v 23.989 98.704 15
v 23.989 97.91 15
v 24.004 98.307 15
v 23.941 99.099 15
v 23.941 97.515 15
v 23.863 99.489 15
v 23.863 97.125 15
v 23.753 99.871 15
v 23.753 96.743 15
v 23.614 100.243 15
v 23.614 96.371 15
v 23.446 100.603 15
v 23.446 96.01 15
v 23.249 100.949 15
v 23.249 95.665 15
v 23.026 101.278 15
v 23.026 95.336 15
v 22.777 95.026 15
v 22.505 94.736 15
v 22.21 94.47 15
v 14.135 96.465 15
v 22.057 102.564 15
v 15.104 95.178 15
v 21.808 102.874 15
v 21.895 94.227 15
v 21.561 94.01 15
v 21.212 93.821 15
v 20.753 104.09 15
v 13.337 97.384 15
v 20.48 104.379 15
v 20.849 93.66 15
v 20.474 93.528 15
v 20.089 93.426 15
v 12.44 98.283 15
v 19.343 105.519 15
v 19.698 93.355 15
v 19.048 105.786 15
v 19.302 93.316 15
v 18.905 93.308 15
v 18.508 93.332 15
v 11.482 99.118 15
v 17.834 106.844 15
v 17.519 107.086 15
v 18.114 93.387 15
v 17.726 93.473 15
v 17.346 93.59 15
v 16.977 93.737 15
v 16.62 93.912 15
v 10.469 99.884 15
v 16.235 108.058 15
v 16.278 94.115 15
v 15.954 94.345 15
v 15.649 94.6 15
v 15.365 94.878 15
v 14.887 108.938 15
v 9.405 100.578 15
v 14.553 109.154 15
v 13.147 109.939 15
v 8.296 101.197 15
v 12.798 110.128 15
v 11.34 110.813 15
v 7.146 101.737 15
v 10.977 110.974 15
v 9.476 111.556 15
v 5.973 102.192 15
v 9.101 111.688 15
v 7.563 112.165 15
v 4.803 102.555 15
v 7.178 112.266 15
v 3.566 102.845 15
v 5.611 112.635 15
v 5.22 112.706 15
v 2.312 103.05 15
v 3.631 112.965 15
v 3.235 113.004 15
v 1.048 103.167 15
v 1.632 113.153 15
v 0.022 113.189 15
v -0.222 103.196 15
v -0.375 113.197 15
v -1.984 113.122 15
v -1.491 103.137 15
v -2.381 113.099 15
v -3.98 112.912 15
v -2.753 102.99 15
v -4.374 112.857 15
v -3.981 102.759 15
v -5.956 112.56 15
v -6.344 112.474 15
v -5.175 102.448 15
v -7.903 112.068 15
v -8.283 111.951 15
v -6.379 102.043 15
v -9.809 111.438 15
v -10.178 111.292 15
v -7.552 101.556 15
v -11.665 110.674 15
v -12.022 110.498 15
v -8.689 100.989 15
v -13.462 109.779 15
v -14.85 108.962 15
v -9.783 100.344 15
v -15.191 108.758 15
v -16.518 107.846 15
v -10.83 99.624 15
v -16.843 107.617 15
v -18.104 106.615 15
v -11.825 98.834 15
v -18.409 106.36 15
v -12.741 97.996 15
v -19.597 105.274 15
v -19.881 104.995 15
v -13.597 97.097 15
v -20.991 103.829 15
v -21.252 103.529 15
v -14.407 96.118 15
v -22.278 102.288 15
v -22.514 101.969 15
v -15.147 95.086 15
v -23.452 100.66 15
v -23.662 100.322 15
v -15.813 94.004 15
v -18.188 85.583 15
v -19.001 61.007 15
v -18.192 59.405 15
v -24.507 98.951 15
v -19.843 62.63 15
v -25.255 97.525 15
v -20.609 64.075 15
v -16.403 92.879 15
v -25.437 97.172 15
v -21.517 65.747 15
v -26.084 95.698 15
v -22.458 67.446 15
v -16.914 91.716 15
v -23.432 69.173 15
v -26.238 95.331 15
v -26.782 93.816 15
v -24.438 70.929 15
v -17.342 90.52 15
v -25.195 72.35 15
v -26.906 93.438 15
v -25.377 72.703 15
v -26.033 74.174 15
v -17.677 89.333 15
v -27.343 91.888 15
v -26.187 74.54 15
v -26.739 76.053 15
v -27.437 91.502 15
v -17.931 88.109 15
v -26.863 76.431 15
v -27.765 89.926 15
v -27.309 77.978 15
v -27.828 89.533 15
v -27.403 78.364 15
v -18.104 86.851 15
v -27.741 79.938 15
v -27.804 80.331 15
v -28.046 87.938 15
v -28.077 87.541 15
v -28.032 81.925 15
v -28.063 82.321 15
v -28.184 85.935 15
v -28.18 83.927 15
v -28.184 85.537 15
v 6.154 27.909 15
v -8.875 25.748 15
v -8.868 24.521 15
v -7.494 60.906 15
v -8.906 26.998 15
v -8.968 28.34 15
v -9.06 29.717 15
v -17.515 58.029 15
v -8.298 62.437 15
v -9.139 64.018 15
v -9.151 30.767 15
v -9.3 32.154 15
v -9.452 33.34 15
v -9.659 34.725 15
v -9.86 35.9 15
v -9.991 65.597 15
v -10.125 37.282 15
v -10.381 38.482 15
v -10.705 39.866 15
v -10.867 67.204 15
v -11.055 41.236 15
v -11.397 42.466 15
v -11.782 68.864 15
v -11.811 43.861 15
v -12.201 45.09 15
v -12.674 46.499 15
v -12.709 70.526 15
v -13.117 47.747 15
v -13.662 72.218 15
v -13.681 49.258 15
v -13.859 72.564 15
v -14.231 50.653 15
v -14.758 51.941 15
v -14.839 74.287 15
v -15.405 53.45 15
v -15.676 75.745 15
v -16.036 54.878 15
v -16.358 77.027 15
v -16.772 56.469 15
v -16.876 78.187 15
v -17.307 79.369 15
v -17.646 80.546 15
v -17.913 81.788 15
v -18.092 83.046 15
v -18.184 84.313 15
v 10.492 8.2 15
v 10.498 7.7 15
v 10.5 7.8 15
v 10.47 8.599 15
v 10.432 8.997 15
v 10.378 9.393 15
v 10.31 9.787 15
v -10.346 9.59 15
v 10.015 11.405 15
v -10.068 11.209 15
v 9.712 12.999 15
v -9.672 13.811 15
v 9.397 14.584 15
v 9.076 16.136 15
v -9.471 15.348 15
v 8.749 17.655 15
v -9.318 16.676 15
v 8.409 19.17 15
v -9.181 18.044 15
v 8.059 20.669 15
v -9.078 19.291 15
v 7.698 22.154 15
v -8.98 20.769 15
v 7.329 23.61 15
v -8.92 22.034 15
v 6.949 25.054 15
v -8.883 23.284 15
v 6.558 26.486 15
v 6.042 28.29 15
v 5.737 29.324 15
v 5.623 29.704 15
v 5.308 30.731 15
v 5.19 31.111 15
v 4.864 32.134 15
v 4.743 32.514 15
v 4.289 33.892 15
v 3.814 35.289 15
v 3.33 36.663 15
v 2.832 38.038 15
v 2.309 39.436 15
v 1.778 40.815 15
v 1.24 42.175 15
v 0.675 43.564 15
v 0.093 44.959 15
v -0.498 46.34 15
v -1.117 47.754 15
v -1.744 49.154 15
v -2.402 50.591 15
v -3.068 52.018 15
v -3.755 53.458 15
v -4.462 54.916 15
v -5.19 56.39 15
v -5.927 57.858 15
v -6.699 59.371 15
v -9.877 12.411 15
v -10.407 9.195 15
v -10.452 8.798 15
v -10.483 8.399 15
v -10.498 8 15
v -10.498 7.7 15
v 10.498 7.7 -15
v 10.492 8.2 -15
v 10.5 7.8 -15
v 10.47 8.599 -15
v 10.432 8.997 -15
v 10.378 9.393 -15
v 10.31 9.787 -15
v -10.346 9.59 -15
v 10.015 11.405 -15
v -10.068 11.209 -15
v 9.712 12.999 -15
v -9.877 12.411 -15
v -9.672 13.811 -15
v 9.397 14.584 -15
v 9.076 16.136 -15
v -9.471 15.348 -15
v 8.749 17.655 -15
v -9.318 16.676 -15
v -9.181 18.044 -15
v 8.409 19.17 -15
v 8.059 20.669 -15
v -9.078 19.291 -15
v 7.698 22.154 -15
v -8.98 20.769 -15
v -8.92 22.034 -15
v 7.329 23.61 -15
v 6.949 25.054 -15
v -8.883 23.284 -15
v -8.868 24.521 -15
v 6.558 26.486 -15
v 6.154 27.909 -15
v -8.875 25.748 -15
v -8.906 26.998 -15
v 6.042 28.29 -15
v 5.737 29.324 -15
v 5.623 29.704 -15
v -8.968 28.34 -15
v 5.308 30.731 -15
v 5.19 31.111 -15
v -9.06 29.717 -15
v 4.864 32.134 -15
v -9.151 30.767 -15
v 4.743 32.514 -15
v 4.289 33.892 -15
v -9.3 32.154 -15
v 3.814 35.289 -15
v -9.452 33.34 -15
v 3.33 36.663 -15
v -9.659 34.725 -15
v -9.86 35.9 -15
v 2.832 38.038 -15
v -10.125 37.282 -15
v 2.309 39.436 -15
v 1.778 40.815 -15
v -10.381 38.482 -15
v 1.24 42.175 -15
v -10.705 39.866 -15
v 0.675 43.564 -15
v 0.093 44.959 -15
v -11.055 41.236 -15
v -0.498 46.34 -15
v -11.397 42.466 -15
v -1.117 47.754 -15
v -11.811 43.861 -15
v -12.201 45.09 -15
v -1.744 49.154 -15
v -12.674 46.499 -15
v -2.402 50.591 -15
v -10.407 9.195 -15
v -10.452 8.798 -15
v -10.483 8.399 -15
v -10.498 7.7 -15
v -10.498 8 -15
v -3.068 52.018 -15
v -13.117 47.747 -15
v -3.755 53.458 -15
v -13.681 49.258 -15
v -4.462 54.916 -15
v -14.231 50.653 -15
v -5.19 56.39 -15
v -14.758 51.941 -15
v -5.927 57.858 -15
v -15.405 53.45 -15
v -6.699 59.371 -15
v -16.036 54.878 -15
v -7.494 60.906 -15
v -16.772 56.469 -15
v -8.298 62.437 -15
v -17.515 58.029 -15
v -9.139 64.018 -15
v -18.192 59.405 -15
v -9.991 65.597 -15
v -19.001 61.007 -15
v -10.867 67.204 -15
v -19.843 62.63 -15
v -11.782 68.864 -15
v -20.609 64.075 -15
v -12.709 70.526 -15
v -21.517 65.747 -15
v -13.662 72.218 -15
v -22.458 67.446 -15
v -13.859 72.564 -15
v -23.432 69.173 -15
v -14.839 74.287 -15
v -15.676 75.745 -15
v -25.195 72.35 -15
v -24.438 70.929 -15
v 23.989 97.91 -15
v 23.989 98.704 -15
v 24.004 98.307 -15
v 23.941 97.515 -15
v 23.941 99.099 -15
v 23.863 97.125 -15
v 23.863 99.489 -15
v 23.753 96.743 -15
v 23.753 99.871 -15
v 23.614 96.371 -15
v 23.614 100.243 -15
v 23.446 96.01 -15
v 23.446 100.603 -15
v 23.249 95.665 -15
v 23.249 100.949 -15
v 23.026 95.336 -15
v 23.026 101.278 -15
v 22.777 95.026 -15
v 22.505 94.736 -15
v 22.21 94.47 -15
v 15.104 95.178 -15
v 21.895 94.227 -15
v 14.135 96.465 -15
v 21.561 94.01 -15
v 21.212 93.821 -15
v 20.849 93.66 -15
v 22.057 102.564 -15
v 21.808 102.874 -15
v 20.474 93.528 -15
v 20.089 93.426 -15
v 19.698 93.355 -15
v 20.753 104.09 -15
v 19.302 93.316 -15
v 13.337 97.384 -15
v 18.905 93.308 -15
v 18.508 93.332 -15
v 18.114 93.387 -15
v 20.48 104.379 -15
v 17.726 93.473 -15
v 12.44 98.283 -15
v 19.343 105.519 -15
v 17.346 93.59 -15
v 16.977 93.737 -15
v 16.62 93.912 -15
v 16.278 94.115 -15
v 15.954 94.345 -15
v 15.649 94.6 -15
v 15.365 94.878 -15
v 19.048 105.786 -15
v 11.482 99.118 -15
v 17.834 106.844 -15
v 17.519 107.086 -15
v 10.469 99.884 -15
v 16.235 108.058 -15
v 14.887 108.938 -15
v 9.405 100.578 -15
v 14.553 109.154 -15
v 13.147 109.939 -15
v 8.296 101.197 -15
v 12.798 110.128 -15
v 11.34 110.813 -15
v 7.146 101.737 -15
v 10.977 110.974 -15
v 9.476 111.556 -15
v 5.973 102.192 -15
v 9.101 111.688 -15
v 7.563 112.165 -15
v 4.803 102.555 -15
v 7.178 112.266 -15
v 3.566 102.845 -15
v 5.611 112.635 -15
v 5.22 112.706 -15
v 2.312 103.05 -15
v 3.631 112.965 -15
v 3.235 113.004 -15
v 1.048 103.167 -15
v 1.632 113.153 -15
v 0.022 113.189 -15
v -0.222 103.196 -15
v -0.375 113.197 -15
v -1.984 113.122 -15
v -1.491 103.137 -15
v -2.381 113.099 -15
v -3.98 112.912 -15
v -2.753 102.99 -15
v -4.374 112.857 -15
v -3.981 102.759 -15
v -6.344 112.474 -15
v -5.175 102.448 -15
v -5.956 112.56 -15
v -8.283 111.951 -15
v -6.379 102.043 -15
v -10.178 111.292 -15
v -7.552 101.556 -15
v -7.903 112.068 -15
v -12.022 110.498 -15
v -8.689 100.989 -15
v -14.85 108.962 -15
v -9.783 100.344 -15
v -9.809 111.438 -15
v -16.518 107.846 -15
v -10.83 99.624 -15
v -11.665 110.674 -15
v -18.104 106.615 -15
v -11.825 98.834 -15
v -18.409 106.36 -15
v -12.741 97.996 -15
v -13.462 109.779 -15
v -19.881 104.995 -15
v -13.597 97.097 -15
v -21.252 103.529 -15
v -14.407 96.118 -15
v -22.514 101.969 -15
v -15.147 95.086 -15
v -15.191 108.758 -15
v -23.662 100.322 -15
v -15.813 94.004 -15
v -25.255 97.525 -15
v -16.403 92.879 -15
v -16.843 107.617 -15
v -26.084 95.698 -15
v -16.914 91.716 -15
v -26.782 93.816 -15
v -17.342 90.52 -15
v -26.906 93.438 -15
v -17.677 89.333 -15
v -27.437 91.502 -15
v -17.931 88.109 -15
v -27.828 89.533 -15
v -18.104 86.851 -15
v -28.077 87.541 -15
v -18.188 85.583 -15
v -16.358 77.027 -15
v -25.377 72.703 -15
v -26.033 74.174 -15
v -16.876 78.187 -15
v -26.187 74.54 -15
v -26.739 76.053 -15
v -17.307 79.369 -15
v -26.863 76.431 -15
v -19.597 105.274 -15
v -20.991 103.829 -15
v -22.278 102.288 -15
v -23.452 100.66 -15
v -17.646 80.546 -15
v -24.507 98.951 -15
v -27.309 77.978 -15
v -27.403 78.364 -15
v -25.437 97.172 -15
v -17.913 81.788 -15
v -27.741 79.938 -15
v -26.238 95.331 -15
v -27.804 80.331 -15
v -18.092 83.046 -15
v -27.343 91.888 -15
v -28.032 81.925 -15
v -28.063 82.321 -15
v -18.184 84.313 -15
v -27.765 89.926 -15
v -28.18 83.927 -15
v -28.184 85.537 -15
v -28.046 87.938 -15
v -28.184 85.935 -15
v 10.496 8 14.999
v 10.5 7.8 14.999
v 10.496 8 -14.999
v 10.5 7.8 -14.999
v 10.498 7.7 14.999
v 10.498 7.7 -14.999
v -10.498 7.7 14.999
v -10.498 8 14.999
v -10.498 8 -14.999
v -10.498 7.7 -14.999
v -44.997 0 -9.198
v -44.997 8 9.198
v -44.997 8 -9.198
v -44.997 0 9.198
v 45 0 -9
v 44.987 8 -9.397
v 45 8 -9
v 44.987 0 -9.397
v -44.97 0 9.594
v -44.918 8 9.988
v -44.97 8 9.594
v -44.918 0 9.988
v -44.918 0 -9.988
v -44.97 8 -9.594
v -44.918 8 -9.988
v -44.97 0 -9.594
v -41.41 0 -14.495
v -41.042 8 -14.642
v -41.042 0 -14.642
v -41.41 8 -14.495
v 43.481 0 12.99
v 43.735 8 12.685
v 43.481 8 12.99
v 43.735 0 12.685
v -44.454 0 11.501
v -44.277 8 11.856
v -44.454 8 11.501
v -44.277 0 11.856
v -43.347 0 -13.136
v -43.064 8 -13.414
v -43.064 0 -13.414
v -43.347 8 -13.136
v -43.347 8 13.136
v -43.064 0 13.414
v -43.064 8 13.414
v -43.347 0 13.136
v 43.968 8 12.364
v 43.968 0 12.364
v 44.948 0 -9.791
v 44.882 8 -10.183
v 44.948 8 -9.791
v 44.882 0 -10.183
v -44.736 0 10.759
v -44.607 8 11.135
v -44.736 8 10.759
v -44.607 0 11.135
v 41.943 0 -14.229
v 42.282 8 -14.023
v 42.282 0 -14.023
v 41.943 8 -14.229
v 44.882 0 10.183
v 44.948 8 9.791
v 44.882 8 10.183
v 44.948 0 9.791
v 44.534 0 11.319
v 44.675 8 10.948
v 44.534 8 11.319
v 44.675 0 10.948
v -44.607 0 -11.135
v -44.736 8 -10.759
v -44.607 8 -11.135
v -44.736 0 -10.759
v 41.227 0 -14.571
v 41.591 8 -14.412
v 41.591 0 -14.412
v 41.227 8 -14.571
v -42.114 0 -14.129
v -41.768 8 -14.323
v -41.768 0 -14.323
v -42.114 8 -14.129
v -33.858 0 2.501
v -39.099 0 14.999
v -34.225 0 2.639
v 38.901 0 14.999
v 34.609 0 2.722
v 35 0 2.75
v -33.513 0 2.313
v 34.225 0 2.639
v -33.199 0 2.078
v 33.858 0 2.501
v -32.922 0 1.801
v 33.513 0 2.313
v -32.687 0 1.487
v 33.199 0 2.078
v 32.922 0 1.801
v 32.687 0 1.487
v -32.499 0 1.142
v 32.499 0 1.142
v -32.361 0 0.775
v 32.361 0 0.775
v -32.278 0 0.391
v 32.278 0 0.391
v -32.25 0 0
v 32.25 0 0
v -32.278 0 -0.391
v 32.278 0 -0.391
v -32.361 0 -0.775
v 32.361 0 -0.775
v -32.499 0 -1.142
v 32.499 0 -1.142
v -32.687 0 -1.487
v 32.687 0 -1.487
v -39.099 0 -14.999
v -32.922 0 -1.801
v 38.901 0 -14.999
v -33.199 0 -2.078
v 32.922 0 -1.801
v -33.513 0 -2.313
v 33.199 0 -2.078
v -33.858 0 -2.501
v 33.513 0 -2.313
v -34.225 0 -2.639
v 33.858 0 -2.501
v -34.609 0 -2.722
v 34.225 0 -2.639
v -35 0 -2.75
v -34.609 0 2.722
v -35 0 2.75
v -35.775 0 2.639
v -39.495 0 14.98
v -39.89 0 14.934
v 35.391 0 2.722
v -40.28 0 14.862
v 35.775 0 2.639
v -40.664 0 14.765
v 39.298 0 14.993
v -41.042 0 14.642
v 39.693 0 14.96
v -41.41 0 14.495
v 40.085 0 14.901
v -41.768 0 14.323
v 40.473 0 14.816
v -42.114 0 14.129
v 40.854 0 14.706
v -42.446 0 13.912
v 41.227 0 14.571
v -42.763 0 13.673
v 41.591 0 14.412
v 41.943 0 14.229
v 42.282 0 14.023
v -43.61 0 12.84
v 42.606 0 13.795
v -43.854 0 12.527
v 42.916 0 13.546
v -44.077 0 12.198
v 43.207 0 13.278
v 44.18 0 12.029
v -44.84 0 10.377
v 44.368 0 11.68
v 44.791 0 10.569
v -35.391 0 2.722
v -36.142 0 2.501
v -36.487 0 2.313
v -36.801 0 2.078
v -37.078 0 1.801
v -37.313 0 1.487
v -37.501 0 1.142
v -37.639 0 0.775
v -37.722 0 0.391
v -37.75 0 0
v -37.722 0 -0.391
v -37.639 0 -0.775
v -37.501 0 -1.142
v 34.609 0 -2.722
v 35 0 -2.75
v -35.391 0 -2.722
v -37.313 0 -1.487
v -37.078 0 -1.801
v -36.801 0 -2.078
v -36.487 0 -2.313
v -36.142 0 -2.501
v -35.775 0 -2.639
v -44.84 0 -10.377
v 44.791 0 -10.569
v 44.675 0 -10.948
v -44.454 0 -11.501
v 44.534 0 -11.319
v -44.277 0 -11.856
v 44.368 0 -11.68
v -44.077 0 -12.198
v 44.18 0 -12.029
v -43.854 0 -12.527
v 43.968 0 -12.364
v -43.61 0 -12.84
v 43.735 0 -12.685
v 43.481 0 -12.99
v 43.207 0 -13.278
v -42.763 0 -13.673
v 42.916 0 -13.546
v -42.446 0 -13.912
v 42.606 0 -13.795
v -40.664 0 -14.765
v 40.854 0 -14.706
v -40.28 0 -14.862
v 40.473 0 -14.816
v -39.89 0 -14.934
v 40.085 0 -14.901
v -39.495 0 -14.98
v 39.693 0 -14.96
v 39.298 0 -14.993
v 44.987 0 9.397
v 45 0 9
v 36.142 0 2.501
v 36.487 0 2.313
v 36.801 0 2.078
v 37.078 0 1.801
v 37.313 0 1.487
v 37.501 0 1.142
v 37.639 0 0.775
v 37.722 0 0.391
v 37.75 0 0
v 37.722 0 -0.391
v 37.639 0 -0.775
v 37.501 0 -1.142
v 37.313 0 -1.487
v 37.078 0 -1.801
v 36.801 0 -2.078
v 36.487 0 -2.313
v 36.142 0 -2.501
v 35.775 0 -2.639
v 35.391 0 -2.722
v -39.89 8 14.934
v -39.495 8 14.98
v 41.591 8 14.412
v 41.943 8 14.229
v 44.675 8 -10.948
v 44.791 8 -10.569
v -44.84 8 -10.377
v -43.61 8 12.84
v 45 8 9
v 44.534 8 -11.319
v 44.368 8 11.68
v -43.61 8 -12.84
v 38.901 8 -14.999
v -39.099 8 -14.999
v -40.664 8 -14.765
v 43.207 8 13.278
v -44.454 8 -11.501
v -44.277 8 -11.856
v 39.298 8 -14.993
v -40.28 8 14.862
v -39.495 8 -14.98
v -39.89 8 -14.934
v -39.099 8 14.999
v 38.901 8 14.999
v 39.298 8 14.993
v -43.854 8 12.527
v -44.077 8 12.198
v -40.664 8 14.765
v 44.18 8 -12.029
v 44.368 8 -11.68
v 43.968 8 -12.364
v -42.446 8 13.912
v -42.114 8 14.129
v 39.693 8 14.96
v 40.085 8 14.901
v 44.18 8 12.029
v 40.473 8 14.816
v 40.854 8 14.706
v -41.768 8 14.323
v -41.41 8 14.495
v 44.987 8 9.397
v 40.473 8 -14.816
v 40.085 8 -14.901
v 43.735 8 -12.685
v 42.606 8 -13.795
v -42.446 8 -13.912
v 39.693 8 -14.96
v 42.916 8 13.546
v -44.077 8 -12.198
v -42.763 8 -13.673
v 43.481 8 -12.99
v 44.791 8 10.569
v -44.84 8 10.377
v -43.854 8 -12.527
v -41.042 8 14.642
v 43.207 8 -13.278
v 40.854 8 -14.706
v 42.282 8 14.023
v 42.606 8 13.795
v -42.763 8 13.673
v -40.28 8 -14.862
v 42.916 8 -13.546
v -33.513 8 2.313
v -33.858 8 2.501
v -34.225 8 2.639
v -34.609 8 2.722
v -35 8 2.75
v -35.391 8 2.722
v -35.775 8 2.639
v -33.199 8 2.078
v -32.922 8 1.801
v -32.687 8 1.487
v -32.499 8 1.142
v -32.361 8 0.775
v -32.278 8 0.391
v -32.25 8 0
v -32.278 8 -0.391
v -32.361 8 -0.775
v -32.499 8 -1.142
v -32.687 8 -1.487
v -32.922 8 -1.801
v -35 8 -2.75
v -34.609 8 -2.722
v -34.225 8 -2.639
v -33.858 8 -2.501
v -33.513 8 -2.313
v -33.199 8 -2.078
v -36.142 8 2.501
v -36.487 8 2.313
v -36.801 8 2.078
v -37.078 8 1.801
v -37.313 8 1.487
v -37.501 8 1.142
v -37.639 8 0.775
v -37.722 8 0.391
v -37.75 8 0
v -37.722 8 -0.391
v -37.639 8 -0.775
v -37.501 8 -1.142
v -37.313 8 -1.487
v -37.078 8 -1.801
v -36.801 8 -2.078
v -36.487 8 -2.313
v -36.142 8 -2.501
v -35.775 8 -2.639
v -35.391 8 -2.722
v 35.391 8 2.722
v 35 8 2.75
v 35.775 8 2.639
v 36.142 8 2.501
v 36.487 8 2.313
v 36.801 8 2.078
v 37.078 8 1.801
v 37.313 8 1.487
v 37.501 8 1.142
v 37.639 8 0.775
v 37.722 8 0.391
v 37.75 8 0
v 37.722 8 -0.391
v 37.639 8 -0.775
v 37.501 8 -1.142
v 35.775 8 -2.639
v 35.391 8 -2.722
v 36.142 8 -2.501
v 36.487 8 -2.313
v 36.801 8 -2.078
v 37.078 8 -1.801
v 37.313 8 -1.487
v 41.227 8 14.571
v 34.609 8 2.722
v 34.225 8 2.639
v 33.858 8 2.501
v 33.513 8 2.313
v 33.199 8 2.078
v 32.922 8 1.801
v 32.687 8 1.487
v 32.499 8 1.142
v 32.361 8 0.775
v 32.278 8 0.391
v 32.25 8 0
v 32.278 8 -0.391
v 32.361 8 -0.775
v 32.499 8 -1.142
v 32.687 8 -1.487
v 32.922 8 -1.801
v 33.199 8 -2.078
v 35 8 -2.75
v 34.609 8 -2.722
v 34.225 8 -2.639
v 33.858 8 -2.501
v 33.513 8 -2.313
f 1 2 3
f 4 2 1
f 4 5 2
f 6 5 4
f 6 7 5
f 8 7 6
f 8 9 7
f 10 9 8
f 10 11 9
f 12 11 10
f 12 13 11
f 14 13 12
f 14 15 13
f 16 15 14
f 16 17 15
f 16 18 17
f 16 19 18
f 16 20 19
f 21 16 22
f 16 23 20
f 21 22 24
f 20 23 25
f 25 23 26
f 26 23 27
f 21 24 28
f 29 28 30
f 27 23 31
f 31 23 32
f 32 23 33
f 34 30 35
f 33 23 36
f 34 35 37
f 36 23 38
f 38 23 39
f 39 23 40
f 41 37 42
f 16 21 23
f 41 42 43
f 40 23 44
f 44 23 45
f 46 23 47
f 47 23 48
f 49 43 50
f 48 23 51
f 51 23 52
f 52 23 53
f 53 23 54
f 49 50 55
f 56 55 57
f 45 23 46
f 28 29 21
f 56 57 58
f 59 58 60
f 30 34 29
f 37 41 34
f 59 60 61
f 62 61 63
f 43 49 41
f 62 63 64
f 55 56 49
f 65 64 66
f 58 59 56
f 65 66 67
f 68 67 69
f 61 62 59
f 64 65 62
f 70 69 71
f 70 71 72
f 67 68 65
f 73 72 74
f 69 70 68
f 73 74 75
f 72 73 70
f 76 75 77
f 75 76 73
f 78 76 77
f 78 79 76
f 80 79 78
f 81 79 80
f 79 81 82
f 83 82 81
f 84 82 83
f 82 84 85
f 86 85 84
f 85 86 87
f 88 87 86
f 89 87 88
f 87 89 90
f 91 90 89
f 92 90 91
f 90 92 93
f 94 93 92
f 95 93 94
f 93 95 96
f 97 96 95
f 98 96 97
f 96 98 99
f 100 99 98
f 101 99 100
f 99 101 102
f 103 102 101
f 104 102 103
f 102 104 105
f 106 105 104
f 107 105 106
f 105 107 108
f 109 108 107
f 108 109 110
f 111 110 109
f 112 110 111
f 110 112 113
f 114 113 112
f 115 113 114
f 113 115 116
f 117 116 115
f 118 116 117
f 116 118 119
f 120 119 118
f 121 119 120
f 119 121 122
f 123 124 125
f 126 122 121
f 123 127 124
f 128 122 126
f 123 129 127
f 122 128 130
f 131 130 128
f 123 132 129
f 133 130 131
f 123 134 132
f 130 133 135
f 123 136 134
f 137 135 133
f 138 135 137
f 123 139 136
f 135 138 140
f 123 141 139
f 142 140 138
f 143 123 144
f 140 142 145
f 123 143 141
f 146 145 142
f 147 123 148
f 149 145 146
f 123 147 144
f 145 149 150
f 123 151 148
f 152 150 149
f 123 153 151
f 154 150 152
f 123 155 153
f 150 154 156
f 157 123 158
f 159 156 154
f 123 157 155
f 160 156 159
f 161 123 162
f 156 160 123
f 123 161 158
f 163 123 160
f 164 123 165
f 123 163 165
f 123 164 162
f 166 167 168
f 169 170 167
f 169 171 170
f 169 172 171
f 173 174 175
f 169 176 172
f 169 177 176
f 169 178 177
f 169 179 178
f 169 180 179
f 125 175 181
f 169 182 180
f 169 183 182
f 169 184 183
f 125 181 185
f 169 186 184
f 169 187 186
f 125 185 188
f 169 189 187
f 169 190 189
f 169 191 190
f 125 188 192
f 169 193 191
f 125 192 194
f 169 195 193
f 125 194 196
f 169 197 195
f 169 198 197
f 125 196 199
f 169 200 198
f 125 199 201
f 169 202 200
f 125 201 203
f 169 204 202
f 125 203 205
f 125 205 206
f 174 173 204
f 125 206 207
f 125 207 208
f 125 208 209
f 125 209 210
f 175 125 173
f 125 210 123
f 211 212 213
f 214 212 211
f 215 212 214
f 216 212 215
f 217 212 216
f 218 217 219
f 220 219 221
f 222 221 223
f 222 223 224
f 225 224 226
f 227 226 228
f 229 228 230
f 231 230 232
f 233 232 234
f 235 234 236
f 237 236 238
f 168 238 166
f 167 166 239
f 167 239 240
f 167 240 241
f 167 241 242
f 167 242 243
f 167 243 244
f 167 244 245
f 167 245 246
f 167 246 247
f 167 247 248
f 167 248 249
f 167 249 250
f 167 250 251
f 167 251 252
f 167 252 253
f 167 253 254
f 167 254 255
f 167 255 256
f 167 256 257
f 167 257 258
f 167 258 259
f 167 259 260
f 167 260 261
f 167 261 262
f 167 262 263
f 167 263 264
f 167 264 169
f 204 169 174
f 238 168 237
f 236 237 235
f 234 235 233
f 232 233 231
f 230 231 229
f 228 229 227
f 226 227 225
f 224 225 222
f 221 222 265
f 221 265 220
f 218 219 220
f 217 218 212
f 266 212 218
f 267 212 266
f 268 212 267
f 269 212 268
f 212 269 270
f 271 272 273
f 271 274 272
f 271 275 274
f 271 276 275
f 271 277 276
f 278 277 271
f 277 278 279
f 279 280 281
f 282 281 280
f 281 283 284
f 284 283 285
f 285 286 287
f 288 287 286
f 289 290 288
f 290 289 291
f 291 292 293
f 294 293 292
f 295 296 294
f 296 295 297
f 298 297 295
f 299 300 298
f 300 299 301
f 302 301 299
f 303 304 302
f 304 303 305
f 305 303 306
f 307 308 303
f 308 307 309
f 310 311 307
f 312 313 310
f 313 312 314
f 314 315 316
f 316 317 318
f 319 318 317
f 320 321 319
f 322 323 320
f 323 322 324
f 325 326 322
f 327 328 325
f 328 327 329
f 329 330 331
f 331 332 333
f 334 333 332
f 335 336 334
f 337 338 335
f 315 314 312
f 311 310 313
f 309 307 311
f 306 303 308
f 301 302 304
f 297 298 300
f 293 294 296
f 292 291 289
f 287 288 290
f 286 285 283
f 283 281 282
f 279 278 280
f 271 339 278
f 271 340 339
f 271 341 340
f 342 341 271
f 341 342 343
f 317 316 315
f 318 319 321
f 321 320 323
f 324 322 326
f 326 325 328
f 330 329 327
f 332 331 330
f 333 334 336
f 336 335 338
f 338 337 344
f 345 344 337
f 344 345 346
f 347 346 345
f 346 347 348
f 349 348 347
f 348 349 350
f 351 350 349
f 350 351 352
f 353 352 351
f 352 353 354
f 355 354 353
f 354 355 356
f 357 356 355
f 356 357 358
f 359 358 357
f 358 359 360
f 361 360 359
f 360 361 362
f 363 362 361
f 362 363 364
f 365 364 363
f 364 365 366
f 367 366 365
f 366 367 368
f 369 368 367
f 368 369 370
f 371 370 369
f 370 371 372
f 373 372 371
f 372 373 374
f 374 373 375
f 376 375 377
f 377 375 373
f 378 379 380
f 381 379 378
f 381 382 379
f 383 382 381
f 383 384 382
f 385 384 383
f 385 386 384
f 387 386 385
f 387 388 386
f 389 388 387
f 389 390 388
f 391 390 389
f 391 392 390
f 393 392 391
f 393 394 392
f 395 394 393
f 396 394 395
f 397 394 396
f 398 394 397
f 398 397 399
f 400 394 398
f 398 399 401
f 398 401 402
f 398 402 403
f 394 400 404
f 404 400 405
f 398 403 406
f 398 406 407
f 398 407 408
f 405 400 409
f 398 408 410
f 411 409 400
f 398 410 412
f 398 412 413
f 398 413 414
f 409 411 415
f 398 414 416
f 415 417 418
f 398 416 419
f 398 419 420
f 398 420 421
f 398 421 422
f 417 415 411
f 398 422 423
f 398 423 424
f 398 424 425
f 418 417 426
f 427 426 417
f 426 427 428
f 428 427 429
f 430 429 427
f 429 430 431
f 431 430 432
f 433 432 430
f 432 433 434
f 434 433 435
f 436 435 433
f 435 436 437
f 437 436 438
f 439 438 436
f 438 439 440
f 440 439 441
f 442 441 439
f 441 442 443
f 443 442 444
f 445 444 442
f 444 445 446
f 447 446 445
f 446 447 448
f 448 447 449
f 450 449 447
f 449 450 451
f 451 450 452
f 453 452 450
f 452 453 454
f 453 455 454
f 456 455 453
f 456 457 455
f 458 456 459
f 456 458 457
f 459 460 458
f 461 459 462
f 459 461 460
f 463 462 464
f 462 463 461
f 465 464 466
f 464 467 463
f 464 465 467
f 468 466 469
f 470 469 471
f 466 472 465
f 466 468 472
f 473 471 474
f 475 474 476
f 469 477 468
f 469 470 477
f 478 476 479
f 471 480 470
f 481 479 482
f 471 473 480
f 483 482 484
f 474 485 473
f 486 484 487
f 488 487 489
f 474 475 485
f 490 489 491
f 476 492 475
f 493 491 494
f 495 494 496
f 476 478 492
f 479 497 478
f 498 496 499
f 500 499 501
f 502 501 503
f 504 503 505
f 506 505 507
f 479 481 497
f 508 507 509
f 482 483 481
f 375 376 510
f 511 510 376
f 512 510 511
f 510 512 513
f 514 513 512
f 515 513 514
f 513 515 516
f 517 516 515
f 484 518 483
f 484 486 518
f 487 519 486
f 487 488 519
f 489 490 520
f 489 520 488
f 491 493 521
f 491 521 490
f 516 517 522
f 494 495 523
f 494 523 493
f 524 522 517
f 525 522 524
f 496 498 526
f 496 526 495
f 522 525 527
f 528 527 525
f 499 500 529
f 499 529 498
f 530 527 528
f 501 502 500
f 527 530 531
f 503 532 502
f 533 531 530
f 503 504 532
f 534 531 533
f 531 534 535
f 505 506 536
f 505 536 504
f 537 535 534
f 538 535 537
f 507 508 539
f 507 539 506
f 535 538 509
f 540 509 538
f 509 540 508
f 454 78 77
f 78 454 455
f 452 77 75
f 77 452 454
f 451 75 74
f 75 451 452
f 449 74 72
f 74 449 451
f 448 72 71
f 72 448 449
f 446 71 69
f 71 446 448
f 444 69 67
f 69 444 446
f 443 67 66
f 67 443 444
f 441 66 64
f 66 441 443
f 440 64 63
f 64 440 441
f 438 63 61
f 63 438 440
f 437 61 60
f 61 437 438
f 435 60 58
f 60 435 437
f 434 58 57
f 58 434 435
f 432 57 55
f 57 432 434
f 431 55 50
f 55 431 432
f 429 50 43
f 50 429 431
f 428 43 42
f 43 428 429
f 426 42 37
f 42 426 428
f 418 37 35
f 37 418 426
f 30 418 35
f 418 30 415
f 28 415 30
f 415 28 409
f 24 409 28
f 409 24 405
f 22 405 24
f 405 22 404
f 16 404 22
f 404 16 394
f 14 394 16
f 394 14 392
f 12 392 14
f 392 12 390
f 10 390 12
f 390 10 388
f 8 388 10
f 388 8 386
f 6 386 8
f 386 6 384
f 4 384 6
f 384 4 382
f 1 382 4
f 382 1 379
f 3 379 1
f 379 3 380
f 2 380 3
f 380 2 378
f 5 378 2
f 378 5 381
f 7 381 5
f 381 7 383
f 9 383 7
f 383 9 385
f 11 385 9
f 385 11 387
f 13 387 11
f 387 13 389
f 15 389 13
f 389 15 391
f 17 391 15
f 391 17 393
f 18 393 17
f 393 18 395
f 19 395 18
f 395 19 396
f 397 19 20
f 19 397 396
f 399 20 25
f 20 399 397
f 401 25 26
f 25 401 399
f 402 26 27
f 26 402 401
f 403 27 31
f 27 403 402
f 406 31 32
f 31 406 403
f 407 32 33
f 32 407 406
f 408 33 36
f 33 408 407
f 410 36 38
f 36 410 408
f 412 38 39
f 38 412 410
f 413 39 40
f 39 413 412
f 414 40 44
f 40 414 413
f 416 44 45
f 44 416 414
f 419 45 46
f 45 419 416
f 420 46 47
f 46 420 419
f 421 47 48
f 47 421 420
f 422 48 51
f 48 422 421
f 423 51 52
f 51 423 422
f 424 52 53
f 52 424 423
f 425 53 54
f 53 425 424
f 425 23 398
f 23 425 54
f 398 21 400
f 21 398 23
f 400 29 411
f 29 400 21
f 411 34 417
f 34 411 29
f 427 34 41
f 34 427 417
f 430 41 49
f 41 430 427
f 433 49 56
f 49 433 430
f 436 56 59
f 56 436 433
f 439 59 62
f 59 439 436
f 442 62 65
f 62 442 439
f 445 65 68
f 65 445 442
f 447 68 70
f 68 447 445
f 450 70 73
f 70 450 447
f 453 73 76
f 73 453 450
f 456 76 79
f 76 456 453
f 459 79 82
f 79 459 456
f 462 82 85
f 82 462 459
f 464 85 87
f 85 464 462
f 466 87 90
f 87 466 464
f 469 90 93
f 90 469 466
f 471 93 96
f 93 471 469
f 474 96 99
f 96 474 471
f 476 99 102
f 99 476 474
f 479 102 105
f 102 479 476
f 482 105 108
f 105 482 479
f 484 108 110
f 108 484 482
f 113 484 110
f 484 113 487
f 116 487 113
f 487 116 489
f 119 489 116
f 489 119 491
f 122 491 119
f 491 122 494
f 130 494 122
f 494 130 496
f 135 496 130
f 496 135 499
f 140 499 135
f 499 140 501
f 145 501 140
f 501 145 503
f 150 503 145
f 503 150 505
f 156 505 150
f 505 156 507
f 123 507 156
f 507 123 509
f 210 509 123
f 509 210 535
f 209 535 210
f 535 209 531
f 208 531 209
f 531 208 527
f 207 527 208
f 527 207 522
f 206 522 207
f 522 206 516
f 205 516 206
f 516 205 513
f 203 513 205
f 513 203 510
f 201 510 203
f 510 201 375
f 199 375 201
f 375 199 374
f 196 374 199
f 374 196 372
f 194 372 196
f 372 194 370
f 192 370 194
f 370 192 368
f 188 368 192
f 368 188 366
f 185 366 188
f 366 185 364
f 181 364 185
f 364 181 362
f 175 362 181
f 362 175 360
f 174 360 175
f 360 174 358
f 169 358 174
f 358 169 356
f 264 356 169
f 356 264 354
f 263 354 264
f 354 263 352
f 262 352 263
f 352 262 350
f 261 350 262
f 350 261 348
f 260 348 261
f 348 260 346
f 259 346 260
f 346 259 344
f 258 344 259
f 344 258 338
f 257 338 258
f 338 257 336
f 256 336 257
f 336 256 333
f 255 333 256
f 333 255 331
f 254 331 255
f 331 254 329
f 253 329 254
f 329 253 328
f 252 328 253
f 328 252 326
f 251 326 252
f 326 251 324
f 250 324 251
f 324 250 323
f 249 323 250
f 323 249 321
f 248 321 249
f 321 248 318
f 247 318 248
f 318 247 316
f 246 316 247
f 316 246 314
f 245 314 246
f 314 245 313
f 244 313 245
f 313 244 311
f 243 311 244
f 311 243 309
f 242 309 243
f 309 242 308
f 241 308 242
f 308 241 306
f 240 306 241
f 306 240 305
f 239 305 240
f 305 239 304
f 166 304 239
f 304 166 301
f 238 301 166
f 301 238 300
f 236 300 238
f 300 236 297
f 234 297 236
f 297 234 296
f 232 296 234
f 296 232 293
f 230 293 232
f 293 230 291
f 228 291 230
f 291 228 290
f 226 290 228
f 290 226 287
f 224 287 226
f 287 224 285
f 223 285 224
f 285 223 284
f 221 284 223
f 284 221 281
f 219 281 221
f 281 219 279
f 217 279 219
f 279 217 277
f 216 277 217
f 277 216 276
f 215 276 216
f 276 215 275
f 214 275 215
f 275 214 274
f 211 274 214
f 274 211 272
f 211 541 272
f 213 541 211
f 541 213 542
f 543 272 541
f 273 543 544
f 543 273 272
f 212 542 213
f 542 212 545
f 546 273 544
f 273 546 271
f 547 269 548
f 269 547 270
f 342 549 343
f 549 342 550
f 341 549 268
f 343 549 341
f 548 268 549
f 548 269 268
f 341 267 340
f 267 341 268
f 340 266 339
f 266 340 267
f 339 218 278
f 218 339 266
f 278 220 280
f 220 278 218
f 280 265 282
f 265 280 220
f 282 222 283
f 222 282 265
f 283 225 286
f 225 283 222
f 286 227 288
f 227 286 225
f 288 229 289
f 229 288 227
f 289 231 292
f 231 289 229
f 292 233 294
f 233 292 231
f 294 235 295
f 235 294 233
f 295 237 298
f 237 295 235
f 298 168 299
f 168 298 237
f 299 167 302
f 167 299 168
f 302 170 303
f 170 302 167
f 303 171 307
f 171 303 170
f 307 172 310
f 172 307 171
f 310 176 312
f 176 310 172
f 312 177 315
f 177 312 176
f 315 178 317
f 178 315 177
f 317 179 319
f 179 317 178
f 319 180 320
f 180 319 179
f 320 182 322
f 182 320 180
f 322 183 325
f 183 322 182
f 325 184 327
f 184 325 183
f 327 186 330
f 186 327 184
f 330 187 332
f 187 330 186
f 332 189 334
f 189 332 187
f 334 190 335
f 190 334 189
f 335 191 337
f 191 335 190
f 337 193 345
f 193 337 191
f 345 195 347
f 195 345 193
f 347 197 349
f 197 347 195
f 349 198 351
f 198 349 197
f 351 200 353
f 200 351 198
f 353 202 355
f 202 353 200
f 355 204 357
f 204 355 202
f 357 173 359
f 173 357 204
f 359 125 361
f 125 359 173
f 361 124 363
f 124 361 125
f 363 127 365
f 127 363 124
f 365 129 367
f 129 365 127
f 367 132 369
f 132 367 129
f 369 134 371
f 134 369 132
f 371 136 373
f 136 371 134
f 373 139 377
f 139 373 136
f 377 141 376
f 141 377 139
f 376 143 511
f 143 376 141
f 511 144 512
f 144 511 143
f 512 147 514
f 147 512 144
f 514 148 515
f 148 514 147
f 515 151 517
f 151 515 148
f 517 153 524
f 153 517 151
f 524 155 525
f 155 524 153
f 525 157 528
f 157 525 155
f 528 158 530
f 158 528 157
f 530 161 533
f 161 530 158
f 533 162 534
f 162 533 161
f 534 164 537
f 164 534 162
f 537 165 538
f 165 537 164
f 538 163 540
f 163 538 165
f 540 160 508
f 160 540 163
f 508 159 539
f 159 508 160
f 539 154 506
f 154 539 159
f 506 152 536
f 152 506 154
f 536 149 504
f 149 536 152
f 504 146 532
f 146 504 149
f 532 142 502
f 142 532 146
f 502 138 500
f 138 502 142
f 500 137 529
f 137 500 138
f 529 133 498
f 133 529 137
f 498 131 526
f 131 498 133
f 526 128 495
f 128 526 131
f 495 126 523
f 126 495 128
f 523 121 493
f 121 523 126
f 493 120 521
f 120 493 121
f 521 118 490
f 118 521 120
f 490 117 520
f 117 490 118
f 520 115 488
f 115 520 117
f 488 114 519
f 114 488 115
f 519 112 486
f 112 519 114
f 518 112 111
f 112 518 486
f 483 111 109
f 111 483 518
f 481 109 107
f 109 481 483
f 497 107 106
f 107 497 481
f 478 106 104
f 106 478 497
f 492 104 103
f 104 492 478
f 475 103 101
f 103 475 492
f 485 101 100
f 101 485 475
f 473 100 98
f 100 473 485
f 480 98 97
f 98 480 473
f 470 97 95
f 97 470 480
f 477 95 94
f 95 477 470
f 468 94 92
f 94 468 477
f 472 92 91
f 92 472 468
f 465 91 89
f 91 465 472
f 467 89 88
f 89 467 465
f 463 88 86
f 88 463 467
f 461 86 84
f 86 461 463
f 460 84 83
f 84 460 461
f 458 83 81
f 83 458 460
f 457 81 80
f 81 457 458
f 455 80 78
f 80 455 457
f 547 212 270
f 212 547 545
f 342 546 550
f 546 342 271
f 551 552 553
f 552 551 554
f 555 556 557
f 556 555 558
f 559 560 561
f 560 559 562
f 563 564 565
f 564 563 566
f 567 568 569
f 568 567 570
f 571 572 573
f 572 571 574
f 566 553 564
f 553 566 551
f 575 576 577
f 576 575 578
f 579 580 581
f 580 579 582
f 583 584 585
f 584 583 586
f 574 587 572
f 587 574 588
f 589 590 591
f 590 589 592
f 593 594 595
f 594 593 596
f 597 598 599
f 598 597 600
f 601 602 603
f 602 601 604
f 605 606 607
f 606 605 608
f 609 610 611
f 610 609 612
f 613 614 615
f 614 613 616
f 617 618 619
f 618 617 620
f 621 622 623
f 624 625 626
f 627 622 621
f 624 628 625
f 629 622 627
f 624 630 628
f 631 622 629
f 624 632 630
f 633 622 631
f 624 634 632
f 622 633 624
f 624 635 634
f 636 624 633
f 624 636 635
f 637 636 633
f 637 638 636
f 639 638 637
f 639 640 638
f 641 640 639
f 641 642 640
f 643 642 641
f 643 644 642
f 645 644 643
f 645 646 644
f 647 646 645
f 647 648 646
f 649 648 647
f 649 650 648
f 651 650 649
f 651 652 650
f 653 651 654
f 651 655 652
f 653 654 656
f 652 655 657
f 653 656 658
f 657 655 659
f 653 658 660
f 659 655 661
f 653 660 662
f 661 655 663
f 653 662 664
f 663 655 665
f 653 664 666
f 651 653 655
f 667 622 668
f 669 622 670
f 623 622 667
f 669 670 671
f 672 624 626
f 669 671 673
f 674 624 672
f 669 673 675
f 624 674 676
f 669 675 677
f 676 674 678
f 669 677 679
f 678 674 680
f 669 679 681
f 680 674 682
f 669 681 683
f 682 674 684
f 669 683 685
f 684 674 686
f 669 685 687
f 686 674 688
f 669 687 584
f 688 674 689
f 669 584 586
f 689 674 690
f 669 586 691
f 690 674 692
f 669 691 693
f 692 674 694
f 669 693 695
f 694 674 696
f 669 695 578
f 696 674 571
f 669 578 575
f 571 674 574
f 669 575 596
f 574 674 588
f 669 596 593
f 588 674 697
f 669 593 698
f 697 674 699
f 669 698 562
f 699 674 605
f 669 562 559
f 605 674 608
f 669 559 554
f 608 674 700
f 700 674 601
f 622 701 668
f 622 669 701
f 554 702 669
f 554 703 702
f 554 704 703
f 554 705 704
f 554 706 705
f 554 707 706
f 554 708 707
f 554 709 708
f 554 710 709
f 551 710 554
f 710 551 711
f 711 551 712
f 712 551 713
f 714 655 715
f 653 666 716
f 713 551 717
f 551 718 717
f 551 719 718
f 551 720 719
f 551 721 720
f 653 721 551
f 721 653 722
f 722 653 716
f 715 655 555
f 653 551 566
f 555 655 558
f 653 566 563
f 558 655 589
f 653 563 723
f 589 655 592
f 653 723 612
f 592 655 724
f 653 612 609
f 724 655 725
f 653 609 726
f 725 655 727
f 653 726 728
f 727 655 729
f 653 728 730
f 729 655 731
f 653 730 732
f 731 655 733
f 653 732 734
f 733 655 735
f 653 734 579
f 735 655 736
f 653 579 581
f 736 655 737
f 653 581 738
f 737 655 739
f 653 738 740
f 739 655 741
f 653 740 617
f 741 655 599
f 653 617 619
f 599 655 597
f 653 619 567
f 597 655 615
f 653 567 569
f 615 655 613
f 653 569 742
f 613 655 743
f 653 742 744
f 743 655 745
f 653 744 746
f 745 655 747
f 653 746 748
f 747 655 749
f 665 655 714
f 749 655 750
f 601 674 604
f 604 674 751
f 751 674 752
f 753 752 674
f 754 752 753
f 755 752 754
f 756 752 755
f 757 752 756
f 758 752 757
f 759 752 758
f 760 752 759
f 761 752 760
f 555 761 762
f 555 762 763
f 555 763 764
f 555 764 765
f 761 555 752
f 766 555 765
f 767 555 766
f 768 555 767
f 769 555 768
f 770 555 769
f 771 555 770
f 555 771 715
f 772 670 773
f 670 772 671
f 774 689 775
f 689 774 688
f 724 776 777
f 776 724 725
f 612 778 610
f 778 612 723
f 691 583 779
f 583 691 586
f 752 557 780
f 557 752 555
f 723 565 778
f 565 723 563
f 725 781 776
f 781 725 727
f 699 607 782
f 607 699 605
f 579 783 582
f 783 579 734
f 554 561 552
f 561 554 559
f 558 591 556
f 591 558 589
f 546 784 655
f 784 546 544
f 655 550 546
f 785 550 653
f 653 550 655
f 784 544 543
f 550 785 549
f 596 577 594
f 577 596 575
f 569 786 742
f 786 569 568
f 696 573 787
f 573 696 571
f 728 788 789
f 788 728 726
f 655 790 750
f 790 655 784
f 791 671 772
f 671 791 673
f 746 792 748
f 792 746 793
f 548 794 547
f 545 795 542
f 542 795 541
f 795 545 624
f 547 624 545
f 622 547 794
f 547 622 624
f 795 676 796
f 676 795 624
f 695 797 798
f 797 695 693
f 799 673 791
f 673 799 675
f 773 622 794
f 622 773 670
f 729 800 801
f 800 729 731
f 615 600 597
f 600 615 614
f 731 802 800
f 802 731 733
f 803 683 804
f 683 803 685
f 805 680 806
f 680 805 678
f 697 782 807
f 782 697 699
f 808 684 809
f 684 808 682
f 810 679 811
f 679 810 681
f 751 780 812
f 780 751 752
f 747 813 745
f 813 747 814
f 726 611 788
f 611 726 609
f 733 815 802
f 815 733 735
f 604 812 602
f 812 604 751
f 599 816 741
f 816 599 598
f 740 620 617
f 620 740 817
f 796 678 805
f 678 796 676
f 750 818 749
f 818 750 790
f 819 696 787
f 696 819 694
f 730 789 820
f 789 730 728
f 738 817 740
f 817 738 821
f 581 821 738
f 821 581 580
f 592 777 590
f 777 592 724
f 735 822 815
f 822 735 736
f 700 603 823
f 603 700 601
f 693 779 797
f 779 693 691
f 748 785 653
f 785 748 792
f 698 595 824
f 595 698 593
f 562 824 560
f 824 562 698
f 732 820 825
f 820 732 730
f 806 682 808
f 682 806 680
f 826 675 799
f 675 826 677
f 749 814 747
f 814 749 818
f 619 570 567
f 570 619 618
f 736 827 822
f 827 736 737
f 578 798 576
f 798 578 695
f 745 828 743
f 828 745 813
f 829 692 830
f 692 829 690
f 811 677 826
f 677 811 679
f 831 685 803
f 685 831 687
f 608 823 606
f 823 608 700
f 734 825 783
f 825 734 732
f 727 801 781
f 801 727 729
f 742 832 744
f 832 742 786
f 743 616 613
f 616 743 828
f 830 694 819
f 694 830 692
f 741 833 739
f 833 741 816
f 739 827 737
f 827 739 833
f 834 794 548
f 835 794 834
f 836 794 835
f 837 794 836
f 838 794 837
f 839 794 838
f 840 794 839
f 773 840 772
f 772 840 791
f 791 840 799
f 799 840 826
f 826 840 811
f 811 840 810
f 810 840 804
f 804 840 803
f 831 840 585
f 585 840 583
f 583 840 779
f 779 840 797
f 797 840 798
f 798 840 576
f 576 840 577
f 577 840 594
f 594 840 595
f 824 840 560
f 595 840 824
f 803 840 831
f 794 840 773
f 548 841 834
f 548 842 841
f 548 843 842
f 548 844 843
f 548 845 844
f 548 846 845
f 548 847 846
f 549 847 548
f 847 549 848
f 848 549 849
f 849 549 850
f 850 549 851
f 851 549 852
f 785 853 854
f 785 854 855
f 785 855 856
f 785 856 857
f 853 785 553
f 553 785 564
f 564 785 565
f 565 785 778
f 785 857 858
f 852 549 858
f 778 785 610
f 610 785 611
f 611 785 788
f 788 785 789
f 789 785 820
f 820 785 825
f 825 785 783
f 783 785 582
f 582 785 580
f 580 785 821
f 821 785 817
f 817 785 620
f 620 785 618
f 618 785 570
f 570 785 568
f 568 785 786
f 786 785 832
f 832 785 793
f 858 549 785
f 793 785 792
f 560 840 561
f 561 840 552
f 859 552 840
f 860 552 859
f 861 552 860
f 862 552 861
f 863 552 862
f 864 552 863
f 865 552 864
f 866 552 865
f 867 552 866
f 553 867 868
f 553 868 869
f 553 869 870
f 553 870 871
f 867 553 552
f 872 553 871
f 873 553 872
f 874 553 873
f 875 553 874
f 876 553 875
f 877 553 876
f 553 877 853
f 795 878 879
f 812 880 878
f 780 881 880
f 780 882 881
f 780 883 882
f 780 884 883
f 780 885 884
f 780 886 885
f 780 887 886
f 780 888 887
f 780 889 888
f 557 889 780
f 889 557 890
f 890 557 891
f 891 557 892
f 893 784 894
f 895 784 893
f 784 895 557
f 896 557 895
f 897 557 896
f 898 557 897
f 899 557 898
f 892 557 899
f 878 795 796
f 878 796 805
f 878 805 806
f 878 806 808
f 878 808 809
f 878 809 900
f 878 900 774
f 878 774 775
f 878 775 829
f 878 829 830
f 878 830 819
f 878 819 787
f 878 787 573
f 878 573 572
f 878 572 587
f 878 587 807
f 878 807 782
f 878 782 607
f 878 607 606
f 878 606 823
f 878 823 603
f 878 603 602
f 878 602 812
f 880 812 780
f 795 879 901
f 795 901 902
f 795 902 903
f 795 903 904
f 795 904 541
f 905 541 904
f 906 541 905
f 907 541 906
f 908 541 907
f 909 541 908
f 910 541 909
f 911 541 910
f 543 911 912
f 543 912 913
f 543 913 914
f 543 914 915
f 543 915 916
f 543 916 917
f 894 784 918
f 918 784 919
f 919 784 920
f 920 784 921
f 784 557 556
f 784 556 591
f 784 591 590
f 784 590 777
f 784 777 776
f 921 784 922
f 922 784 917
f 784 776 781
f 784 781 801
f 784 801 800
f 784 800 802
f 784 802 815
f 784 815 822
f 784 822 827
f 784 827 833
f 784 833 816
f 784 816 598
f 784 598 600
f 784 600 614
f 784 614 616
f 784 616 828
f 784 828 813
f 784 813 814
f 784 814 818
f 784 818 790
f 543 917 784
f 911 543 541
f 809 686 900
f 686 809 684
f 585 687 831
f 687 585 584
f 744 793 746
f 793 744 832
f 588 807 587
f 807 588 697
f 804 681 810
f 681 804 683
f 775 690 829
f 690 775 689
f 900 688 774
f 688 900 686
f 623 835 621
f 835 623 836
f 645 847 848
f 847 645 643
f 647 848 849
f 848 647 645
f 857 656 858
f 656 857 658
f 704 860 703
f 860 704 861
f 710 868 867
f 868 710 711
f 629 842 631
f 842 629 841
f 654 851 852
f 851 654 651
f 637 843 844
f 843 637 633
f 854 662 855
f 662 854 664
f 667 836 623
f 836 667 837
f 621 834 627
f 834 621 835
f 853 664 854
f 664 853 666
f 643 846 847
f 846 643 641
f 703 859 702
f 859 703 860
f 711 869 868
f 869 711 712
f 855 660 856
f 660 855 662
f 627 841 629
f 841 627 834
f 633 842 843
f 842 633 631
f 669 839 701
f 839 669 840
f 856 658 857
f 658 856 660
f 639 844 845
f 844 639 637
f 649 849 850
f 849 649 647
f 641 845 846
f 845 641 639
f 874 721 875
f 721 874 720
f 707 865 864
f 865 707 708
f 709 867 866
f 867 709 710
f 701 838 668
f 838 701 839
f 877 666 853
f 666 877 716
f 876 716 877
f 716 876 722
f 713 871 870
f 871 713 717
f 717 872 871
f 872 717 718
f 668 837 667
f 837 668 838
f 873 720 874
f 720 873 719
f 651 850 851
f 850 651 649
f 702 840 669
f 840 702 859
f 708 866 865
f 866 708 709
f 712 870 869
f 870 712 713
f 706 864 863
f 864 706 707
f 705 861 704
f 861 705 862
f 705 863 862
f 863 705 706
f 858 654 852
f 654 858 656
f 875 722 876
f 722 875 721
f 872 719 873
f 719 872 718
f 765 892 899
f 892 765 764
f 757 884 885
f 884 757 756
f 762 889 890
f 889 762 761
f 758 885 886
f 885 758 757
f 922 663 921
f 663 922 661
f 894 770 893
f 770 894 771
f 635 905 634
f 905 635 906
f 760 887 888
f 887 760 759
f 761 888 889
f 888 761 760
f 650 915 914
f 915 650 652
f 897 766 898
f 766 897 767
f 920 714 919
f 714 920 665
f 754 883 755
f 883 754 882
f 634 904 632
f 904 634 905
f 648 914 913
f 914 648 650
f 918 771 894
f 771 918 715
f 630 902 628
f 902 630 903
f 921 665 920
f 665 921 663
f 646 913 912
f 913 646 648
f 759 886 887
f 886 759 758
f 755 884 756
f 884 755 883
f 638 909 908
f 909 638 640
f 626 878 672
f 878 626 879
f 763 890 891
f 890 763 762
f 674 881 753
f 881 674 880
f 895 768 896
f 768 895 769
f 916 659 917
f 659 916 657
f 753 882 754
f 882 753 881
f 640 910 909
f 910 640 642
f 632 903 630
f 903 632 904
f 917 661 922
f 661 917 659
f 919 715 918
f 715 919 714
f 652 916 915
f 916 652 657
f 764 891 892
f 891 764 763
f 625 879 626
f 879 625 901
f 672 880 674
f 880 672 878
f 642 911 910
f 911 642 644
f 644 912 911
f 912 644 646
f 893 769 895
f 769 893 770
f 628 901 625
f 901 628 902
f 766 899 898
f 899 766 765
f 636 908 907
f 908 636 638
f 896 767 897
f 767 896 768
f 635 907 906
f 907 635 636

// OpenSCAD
// ============================================================
// Ceiling-Mounted Curtain Rod Bracket
//
// One-piece ABS-friendly bracket for a 35 mm curtain pole.
// The rod sits in a short question-mark hook under a ceiling
// plate so the support is visually more open than a U cradle.
//
// Coordinate system:
//   X = bracket depth / plate long direction
//   Y = rod axis / hook width direction
//   Z = up/down (installed orientation, downward is negative)
//
// All units: millimeters.
// ============================================================

/* [Rod Fit] */
rod_diameter            = 35;
rod_clearance           = 0.7;   // Snug seat for a nominal 35 mm rod (leaves margin for ABS shrinkage)
rod_center_drop         = 85;

/* [Ceiling Plate] */
plate_length            = 30;
plate_width             = 90;
plate_thickness         = 8;
plate_corner_radius     = 6;

/* [Mounting Holes] */
hole_diameter           = 5.5;   // M5 clearance
hole_spacing            = 70;
center_hole_enabled     = false;

/* [Hook] */
hook_width              = 30;
hook_body_thickness     = 10;   // Slimmed: ~5x safety on a 10 kg impulse (center bracket; ends carried by metal hooks)
hook_wrap_angle         = 175;   // Open question-mark mouth; arc ends ~325 deg in a clean rounded terminus
hook_embed_depth        = 0.3;   // Keeps the hook tied into the plate without reaching the top face

/* [Neck] */
transition_join_angle   = 150;   // Arc angle where the neck meets the hook
neck_handle_top         = 24;    // Bezier handle length leaving the plate (straight down)
neck_handle_join        = 30;    // Bezier handle length arriving at the hook (arc-tangent)
neck_root_flare         = 5.5;   // Extra radius blended into the plate, tapering to the bar radius
neck_flare_power        = 2.3;   // Higher = flare concentrated closer to the plate

/* [View] */
export_mode             = "print"; // assembly, print
show_rod_preview        = true;
rod_preview_length      = 150;

/* [Quality] */
$fa                     = 1;
$fs                     = 0.4;

// ============================================================
// DERIVED
// ============================================================

rod_radius              = rod_diameter / 2;
seat_radius             = rod_radius + rod_clearance;
hook_bar_radius         = hook_body_thickness / 2;
hook_centerline_radius  = seat_radius + hook_bar_radius;
rod_center_x            = 0;
hook_end_angle          = transition_join_angle + hook_wrap_angle;
stem_x                  = 0;
plate_underside_z       = -plate_thickness;
hook_clip_top_z         = plate_underside_z + hook_embed_depth;
transition_join_x       = rod_center_x + hook_centerline_radius * cos(transition_join_angle);
transition_join_z       = -rod_center_drop + hook_centerline_radius * sin(transition_join_angle);
transition_join_tangent_x = -sin(transition_join_angle);
transition_join_tangent_z = cos(transition_join_angle);
hole_edge_margin        = (plate_width - hole_spacing - hole_diameter) / 2;

// ============================================================
// HELPERS
// ============================================================

module rounded_rect_2d(w, h, r) {
    corner_r = min(r, w / 2 - 0.01, h / 2 - 0.01);
    hull() {
        translate([ w / 2 - corner_r,  h / 2 - corner_r]) circle(r = corner_r);
        translate([-w / 2 + corner_r,  h / 2 - corner_r]) circle(r = corner_r);
        translate([ w / 2 - corner_r, -h / 2 + corner_r]) circle(r = corner_r);
        translate([-w / 2 + corner_r, -h / 2 + corner_r]) circle(r = corner_r);
    }
}

module rounded_block(w, d, h, r) {
    linear_extrude(height = h, center = true)
        rounded_rect_2d(w, d, r);
}

module circle_segment_2d(p0, p1, r) {
    hull() {
        translate(p0) circle(r = r);
        translate(p1) circle(r = r);
    }
}

module tapered_segment_2d(p0, r0, p1, r1) {
    hull() {
        translate(p0) circle(r = r0);
        translate(p1) circle(r = r1);
    }
}

function cubic_bezier_2d(p0, p1, p2, p3, t) = [
    pow(1 - t, 3) * p0[0] + 3 * pow(1 - t, 2) * t * p1[0] + 3 * (1 - t) * pow(t, 2) * p2[0] + pow(t, 3) * p3[0],
    pow(1 - t, 3) * p0[1] + 3 * pow(1 - t, 2) * t * p1[1] + 3 * (1 - t) * pow(t, 2) * p2[1] + pow(t, 3) * p3[1]
];

// ============================================================
// GEOMETRY
// ============================================================

module ceiling_plate() {
    translate([0, 0, -plate_thickness / 2])
        rounded_block(plate_width, plate_length, plate_thickness, plate_corner_radius);
}

module hook_profile_2d() {
    arc_steps = 44;
    neck_steps = 44;
    rod_center = [rod_center_x, -rod_center_drop];

    // One continuous centerline: leaves the plate underside heading straight down,
    // then sweeps into the hook arc's tangent at the join (G1 continuous with the arc).
    neck_p0 = [stem_x, plate_underside_z + 0.2];
    neck_join = [transition_join_x, transition_join_z];
    neck_ts = [0, -1];
    neck_te = [transition_join_tangent_x, transition_join_tangent_z];
    neck_p1 = [neck_p0[0] + neck_ts[0] * neck_handle_top,
               neck_p0[1] + neck_ts[1] * neck_handle_top];
    neck_p2 = [neck_join[0] - neck_te[0] * neck_handle_join,
               neck_join[1] - neck_te[1] * neck_handle_join];
    neck_points = [for (i = [0 : neck_steps])
        cubic_bezier_2d(neck_p0, neck_p1, neck_p2, neck_join, i / neck_steps)];

    arc_points = [for (i = [0 : arc_steps])
        let(angle = transition_join_angle + (hook_end_angle - transition_join_angle) * i / arc_steps)
            [rod_center[0] + hook_centerline_radius * cos(angle),
             rod_center[1] + hook_centerline_radius * sin(angle)]];

    union() {
        // Neck: flares into the plate, tapering smoothly to the bar radius at the join.
        for (i = [0 : len(neck_points) - 2])
            let(
                t0 = i / (len(neck_points) - 1),
                t1 = (i + 1) / (len(neck_points) - 1),
                r0 = hook_bar_radius + neck_root_flare * pow(1 - t0, neck_flare_power),
                r1 = hook_bar_radius + neck_root_flare * pow(1 - t1, neck_flare_power)
            )
                tapered_segment_2d(neck_points[i], r0, neck_points[i + 1], r1);

        for (i = [0 : len(arc_points) - 2])
            circle_segment_2d(arc_points[i], arc_points[i + 1], hook_bar_radius);
    }
}

module hook_body() {
    intersection() {
        rotate([90, 0, 0])
            linear_extrude(height = hook_width, center = true, convexity = 10)
                hook_profile_2d();

        translate([-plate_width, -plate_length, -400])
            cube([plate_width * 2, plate_length * 2, hook_clip_top_z + 400], center = false);
    }
}

module mounting_holes() {
    for (side = [-1, 1])
        translate([side * hole_spacing / 2, 0, -plate_thickness / 2])
            cylinder(h = plate_thickness + 0.4, d = hole_diameter, center = true);

    if (center_hole_enabled)
        translate([0, 0, -plate_thickness / 2])
            cylinder(h = plate_thickness + 0.4, d = hole_diameter, center = true);
}

module rod_preview() {
    translate([rod_center_x, 0, -rod_center_drop])
        rotate([90, 0, 0])
            cylinder(h = rod_preview_length, d = rod_diameter, center = true);
}

module ceiling_curtain_rod_bracket() {
    difference() {
        union() {
            ceiling_plate();
            hook_body();
        }
        mounting_holes();
    }
}

module assembly_view() {
    color("DarkOrange")
        ceiling_curtain_rod_bracket();

    if (show_rod_preview)
        color([0.72, 0.72, 0.72, 0.35])
            rod_preview();
}

module print_view() {
    color("DarkOrange")
        rotate([90, 0, 0])
            ceiling_curtain_rod_bracket();
}

// ============================================================
// EXPORT
// ============================================================

if (export_mode == "assembly") {
    assembly_view();
} else {
    print_view();
}
